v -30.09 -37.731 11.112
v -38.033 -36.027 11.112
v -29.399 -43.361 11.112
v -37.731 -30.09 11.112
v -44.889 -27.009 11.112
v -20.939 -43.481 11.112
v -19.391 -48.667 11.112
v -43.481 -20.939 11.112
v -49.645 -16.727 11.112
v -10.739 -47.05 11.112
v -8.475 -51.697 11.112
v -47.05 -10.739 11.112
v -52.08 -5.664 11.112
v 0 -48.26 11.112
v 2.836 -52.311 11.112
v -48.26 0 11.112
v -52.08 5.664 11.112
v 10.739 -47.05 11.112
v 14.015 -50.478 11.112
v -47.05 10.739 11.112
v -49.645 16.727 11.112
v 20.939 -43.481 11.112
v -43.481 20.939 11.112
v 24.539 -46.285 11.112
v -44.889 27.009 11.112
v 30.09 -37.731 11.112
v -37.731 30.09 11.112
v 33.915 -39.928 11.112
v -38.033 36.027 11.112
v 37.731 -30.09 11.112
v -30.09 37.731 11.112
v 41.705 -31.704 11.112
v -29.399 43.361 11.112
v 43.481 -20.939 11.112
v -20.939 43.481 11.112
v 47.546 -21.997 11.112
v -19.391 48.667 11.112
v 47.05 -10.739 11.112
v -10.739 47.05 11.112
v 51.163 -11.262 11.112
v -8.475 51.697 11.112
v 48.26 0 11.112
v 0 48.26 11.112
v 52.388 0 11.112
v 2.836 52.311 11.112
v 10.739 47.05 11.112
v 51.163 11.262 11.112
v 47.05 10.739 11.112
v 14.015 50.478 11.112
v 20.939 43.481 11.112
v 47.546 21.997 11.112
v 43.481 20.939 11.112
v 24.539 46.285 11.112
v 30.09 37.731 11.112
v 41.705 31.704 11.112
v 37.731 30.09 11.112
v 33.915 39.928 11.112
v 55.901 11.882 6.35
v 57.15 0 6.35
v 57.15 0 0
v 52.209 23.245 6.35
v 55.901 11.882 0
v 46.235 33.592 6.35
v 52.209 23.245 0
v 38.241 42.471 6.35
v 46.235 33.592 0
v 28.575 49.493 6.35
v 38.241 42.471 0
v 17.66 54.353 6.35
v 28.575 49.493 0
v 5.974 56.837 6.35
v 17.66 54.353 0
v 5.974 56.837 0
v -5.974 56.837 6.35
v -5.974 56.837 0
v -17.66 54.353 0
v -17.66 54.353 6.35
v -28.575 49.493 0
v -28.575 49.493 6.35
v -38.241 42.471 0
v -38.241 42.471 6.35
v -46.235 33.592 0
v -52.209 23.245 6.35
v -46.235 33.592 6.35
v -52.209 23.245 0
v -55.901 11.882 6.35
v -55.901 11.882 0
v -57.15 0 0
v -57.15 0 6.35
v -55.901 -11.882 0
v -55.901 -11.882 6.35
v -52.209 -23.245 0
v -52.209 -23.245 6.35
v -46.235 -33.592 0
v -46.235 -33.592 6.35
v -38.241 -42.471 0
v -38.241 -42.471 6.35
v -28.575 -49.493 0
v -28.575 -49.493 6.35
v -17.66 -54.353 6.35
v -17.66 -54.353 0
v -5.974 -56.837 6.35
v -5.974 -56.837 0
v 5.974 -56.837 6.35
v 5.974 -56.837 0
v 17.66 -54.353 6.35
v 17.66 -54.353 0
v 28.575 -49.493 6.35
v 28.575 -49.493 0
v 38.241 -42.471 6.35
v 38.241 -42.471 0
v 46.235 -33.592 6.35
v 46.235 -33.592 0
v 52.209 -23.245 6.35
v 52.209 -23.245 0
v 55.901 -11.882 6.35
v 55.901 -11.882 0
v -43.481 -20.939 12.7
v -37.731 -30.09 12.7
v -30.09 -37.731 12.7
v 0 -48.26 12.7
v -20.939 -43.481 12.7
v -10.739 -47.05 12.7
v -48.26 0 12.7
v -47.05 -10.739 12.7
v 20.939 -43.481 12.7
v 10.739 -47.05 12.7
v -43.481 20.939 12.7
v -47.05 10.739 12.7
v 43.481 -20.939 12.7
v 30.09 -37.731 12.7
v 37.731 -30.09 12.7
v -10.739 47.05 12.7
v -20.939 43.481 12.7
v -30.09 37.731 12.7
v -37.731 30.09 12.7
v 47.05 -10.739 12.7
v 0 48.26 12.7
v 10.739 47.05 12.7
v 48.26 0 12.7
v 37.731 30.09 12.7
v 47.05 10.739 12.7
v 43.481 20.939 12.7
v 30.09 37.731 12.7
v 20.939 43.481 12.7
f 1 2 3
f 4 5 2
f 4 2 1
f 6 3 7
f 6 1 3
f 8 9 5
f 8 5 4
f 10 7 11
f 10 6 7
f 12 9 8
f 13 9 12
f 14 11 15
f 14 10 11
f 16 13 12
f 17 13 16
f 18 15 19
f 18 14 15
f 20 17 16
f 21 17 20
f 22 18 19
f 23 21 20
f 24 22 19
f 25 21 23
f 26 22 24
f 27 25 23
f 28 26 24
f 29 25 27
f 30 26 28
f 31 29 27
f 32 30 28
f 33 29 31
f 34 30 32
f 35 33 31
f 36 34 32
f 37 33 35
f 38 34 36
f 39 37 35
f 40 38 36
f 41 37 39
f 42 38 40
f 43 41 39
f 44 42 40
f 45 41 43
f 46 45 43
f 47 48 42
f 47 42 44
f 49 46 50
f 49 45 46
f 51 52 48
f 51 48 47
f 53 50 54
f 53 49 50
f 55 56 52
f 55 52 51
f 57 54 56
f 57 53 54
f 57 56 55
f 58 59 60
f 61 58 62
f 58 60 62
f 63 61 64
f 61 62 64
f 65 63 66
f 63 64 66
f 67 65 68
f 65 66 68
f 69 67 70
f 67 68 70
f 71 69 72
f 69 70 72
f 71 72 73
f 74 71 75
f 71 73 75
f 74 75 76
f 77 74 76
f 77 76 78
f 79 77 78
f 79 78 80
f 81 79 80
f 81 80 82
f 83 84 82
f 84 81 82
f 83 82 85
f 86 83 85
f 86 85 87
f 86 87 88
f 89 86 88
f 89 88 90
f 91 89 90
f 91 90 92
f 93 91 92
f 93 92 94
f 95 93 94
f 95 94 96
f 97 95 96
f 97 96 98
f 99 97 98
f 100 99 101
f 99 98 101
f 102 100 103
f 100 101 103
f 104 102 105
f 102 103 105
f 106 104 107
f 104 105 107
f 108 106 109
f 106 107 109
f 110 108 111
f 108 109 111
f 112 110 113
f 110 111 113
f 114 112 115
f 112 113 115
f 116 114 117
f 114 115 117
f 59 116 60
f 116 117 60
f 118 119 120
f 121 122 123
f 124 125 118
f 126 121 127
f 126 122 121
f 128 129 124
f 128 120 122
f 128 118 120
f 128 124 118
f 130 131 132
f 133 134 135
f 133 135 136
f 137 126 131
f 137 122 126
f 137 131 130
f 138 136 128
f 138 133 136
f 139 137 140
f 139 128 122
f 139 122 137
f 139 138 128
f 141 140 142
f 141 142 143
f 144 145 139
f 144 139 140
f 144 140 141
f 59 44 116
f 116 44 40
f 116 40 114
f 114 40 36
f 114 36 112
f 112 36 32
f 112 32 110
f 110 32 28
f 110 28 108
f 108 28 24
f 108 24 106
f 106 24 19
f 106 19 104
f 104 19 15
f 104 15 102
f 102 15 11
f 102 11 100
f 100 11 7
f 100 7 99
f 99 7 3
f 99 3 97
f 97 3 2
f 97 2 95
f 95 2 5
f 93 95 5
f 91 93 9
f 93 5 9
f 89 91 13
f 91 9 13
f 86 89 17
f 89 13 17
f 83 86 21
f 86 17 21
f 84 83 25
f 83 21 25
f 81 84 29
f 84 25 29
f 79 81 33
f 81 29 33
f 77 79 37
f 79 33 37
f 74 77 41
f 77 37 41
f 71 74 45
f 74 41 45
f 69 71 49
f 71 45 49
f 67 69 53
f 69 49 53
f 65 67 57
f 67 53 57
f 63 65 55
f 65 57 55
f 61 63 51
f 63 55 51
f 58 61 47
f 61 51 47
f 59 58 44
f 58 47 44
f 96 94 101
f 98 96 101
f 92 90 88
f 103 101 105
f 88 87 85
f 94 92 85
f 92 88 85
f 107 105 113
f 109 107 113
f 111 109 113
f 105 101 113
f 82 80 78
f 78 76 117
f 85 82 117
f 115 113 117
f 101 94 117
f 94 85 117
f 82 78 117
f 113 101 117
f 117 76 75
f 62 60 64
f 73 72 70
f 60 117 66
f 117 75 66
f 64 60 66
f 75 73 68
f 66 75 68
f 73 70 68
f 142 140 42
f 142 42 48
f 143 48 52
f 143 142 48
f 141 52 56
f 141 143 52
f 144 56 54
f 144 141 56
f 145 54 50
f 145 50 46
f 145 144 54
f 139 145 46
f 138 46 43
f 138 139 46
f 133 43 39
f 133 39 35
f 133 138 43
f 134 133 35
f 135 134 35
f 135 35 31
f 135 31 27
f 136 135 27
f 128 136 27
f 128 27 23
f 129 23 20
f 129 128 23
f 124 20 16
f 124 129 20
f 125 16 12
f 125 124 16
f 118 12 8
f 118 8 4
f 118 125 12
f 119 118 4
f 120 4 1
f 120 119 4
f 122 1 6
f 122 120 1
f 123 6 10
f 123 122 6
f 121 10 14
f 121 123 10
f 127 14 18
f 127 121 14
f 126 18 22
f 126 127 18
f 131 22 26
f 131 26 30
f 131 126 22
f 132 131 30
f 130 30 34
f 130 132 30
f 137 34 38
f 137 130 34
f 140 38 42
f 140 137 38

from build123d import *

# Parameters (mm, degrees)
F0_R     = 57.15
F1_DEPTH = 12.7
F2_R     = 82.073796
F2_R_2   = 48.26
F3_DEPTH = 1.5875
F4_SIZE  = 4.7625


with BuildPart() as f1:
    # F0 (on Top) → F1 (new body)
    with BuildSketch(Plane.XY):
        Circle(F0_R)
    extrude(amount=F1_DEPTH)

    # F2 (on face) → F3 (cut)
    with BuildSketch(Plane.XY.offset(12.7)):
        Circle(F2_R)
        Circle(F2_R_2, mode=Mode.SUBTRACT)
    extrude(amount=-F3_DEPTH, mode=Mode.SUBTRACT)

    # F4
    f4_edges = [f1.edges().sort_by_distance(p)[0] for p in [
        (-57.15, 0, 11.1125),
    ]]
    chamfer(f4_edges, length=F4_SIZE)


solid = f1.part
